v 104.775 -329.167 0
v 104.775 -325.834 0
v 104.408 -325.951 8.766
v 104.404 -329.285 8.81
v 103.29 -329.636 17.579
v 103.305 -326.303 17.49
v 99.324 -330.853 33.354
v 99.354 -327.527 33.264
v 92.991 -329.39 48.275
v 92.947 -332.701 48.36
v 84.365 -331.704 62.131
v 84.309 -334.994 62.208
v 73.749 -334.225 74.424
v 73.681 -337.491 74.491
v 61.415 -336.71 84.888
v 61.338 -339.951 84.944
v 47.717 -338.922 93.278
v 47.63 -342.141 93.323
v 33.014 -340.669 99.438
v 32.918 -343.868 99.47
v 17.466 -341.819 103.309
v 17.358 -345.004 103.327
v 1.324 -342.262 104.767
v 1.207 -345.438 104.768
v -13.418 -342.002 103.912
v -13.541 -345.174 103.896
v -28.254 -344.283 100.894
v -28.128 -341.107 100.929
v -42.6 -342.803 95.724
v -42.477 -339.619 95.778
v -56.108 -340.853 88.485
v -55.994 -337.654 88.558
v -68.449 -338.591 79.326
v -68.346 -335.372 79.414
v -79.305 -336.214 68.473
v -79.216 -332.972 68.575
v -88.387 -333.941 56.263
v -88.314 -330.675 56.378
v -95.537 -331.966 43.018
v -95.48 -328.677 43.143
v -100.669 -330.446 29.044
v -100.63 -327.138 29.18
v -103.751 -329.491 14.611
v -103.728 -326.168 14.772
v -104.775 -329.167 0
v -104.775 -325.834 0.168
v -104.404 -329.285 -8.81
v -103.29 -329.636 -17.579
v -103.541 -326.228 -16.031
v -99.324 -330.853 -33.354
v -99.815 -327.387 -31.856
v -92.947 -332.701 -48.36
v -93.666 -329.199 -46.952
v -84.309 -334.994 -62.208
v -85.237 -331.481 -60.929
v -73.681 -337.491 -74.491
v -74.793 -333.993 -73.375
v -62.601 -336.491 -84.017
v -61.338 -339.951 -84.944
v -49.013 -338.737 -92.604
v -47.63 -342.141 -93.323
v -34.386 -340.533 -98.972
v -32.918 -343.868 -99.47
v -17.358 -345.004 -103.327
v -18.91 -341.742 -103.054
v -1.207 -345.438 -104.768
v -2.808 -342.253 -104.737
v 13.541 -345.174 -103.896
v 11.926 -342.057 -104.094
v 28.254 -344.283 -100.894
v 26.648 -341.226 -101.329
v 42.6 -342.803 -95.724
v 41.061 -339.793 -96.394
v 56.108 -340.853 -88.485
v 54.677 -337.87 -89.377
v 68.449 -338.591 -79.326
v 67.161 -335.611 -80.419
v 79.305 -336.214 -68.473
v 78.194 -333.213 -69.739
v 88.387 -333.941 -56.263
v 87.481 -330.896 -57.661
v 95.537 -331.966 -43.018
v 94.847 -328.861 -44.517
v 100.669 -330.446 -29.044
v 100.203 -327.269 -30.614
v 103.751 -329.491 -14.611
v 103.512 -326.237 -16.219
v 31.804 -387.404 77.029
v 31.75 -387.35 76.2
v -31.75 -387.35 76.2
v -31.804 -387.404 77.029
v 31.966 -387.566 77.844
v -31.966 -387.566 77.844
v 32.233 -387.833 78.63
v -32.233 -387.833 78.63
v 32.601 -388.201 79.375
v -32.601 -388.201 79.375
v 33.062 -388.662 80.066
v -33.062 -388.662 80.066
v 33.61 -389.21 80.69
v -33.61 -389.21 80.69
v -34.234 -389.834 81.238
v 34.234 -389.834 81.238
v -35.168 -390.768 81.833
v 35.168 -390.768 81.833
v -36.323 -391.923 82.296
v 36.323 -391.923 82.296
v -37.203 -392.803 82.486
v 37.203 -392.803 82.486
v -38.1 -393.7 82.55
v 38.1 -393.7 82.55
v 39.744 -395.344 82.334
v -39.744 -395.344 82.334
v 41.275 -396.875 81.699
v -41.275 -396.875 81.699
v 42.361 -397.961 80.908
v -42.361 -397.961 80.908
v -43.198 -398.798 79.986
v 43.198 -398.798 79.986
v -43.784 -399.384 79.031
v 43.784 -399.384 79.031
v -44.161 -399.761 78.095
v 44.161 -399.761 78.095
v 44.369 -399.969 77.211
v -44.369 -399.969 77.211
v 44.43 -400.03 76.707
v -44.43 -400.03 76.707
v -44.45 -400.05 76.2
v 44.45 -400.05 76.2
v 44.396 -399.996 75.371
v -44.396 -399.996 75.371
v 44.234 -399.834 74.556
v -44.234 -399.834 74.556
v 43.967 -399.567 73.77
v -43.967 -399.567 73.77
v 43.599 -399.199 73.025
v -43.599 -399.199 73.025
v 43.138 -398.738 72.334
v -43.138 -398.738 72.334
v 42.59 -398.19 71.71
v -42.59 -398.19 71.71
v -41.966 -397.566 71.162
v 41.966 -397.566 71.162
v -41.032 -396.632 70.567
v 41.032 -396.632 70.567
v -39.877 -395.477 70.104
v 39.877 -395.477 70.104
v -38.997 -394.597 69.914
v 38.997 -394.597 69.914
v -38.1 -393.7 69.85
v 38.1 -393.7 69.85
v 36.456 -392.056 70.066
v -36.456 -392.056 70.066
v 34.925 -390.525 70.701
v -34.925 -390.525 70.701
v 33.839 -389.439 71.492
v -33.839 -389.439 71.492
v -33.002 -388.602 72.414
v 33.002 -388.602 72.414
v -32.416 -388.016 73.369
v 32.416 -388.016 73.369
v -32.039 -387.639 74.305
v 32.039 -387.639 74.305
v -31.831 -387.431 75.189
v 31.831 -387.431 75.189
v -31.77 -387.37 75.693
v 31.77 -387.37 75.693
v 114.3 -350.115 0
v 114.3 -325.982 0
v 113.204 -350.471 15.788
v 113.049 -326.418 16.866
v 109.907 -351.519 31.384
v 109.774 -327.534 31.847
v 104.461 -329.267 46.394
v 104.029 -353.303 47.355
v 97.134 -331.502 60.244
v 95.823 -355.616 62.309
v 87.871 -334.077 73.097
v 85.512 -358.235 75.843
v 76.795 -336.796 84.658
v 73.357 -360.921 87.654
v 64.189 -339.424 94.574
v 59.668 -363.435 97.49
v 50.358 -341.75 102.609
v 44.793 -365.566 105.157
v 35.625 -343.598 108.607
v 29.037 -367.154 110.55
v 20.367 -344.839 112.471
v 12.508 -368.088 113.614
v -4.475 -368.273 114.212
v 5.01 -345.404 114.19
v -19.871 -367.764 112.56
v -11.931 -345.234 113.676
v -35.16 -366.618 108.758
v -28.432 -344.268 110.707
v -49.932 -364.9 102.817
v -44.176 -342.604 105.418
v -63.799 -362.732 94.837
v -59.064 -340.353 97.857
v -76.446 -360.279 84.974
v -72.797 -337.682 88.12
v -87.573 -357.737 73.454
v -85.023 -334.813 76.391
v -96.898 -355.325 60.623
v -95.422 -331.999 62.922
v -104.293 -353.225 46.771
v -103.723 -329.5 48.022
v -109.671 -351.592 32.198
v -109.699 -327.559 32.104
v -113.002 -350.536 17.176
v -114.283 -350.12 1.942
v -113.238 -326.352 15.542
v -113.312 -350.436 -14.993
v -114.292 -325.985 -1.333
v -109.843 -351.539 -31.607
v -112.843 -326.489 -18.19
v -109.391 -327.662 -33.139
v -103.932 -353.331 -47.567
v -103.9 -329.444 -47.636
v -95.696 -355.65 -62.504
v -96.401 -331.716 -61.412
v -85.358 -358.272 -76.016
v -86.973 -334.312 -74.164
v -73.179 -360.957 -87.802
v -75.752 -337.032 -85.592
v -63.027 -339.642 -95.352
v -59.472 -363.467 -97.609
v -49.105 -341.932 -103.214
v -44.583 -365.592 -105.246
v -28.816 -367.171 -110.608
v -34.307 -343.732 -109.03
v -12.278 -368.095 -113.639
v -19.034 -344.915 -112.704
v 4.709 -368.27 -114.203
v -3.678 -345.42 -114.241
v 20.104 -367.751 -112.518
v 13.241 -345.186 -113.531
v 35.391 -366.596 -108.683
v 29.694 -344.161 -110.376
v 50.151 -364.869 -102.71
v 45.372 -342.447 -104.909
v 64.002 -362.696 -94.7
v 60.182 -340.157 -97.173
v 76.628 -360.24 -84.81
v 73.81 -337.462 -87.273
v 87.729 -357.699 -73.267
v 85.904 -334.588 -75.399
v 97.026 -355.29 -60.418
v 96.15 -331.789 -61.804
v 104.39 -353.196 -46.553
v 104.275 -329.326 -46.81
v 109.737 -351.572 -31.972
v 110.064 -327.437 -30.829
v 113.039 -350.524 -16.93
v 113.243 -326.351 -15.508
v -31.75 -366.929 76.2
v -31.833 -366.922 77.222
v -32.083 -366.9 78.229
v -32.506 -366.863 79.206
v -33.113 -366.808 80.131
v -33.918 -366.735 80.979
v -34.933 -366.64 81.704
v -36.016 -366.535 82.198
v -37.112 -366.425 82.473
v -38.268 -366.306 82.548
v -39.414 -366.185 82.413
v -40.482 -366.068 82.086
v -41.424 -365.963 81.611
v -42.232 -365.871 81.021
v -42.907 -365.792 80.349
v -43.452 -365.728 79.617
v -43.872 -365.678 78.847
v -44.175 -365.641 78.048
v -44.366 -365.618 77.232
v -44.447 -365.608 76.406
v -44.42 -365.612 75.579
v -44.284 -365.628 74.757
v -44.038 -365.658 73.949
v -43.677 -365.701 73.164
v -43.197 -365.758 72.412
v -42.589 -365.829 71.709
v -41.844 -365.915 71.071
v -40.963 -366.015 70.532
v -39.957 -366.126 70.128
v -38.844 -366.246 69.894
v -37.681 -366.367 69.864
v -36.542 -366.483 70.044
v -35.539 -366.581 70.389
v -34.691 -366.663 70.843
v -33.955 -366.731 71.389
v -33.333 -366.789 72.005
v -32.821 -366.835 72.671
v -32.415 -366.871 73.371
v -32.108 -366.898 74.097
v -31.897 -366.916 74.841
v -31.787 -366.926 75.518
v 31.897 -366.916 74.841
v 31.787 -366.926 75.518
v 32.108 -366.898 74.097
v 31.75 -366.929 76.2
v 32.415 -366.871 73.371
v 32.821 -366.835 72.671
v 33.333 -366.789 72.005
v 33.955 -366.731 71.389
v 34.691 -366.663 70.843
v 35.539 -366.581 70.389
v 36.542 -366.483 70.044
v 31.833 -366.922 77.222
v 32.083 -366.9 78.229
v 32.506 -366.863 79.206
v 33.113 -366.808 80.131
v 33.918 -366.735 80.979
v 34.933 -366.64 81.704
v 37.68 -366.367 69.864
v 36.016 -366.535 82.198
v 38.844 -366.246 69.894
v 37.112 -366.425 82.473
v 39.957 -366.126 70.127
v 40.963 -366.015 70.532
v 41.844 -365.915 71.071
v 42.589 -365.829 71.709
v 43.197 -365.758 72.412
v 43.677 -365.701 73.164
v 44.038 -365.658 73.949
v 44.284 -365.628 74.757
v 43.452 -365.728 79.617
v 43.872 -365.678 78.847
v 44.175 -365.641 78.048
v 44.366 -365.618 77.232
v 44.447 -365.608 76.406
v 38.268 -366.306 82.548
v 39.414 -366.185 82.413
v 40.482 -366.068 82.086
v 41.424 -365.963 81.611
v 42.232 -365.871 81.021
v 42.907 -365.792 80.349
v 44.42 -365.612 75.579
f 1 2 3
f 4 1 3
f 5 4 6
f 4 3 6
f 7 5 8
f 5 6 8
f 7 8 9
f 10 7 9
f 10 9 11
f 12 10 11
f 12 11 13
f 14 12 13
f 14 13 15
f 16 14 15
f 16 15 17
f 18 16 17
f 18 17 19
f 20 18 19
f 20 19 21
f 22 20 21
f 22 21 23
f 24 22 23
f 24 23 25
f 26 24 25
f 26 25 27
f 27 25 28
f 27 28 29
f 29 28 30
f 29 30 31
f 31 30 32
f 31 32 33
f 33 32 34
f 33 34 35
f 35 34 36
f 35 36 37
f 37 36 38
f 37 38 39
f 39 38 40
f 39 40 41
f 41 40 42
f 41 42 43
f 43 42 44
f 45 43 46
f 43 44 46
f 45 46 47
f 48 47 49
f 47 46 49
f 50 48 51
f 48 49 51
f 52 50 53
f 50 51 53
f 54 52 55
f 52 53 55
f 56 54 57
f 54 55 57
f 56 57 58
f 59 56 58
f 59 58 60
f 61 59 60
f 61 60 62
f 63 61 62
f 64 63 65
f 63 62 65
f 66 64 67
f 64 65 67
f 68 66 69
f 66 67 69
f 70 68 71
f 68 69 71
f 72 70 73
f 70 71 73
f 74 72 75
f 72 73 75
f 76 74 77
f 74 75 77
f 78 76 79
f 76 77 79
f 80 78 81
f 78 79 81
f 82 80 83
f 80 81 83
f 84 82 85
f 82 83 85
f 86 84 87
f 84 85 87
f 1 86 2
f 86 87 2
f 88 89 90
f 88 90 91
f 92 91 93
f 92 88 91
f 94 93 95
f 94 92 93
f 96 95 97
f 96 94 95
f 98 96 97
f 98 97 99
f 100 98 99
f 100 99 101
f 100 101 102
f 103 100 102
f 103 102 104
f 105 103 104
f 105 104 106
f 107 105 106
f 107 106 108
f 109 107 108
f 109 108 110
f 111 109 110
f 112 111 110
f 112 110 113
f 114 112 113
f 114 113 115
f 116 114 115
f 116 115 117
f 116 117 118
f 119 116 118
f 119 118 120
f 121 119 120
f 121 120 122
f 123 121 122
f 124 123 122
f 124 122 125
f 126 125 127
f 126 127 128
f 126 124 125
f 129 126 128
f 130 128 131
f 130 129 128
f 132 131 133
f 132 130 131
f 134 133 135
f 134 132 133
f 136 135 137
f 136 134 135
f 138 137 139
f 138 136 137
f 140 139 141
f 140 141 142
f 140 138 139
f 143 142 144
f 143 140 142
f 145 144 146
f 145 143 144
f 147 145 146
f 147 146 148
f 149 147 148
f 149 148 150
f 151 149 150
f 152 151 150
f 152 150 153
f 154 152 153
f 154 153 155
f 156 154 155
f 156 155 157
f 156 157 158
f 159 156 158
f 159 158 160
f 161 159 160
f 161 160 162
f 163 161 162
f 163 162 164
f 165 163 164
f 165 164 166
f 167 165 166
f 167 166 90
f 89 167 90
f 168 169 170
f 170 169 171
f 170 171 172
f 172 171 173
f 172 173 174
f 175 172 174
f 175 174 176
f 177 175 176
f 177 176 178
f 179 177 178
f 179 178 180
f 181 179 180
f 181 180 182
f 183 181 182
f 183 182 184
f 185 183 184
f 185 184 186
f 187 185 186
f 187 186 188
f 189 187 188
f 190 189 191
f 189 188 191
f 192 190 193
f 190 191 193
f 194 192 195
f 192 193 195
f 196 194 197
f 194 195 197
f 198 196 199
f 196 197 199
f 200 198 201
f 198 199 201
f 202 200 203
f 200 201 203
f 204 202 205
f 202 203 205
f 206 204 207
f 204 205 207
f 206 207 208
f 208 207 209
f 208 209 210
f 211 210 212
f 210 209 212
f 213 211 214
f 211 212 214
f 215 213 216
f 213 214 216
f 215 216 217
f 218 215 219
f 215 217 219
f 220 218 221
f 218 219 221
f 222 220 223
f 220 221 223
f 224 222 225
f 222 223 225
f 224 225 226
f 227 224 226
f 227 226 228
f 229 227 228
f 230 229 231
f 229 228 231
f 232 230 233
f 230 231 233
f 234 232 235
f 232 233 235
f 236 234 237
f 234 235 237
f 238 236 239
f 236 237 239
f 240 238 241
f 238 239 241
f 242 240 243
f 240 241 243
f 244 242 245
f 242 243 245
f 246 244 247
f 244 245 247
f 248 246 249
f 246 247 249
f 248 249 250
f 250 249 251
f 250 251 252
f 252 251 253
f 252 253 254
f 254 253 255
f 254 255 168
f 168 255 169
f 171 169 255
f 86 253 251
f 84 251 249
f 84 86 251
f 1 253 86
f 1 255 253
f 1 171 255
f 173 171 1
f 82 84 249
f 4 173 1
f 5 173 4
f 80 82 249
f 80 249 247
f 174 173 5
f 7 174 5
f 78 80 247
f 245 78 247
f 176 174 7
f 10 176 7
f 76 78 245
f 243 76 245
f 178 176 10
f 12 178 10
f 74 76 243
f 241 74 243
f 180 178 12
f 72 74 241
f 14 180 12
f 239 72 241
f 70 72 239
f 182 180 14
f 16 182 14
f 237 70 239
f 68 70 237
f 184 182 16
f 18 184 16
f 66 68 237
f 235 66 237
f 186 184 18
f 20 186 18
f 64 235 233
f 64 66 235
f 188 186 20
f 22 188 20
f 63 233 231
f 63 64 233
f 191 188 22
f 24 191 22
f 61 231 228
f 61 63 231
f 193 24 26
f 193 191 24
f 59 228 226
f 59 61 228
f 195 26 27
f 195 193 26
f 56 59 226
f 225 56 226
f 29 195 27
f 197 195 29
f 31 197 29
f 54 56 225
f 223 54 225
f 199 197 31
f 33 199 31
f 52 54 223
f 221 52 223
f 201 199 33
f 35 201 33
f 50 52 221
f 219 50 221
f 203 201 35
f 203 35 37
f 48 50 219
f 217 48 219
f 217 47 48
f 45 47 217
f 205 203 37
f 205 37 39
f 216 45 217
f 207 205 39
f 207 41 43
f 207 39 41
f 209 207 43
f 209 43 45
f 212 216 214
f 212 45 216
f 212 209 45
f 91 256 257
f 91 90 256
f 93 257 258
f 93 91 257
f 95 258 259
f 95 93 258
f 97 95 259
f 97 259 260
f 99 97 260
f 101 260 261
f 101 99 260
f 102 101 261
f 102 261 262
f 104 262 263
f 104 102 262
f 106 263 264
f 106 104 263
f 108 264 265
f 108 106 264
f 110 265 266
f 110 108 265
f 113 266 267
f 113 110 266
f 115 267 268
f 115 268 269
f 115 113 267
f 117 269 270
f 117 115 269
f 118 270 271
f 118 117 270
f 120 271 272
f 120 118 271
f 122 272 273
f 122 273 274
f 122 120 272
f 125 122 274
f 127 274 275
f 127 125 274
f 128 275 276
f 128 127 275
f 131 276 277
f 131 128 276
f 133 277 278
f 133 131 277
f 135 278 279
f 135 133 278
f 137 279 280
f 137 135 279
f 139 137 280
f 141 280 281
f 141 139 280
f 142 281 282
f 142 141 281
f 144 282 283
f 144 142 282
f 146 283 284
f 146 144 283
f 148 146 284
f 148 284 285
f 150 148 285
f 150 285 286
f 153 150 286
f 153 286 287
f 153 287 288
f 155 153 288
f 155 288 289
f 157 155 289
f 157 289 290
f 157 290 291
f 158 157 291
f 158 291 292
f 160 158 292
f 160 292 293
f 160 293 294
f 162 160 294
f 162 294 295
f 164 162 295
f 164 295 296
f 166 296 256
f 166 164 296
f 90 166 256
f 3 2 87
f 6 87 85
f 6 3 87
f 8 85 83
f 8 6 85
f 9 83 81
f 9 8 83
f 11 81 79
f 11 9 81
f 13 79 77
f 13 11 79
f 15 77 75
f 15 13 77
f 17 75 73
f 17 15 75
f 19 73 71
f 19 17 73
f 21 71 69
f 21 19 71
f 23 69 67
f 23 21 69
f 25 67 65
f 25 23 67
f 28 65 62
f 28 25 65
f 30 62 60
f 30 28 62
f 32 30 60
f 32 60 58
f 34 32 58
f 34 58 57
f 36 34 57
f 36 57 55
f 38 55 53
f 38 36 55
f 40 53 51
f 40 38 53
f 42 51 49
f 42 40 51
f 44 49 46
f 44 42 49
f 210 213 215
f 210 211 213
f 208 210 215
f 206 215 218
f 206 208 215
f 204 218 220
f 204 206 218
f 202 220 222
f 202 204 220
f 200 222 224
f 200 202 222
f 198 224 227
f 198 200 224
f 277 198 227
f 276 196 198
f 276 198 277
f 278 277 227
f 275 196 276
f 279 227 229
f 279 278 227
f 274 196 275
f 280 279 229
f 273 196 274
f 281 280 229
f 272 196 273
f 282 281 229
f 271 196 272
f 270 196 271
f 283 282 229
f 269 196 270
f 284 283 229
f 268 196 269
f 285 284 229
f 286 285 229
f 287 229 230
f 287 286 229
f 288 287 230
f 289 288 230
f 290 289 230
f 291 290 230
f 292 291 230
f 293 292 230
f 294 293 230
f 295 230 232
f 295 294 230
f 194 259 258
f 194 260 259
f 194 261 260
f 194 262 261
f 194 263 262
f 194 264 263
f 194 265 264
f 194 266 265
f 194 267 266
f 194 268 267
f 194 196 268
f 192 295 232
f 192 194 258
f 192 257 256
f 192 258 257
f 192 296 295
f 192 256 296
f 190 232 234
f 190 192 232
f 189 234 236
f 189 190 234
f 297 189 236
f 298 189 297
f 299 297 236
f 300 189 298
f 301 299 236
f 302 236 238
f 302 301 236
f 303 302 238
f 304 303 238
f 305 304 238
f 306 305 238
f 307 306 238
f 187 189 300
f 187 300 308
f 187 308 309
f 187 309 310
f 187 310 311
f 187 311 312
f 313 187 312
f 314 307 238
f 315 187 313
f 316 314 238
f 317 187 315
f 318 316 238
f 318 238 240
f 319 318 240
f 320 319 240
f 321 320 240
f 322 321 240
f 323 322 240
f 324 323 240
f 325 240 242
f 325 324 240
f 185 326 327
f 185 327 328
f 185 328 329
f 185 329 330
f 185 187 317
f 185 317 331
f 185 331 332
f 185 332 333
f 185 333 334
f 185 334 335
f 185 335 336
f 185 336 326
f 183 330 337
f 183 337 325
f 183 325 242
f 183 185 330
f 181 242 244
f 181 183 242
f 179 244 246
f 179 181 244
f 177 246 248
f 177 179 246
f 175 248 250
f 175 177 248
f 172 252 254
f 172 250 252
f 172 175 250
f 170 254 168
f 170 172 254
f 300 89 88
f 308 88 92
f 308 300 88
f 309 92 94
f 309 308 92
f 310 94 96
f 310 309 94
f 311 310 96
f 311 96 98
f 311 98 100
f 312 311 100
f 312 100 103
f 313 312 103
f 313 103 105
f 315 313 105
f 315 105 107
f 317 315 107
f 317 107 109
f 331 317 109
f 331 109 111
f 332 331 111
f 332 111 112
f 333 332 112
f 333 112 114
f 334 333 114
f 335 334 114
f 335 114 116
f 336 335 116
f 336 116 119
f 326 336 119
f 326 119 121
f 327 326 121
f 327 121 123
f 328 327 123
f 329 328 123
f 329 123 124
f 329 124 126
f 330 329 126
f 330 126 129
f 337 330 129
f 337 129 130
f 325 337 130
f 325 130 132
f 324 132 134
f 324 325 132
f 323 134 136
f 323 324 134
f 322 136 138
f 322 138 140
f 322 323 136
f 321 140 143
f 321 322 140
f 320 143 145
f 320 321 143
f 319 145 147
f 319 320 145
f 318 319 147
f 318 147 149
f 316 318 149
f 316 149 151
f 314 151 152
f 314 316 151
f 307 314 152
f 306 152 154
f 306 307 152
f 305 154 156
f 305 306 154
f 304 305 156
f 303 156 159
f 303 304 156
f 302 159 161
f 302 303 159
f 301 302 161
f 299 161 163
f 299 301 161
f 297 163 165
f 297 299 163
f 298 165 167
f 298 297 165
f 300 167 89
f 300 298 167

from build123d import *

# Parameters (mm, degrees)
F1_DEPTH = 104.775
F2_R     = 159.2251472174
F2_R_2   = 104.775
F3_DEPTH = 414.02
F5_DEPTH = 114.3
F6_R     = 184.3026005328
F6_R_2   = 114.3
F7_DEPTH = 563.88
F9_R     = 6.35


with BuildPart() as f1:
    # F0 (on Top) → F1 (new body, symmetric)
    with BuildSketch(Plane.XY):
        with BuildLine():
            ThreePointArc((104.775, -325.833591884), (0, -342.265), (-104.775, -325.833591884))
            Line((-104.775, -325.833591884), (-104.775, -329.1671201305))
            ThreePointArc((-104.775, -329.1671201305), (0, -345.44), (104.775, -329.1671201305))
            Line((104.775, -329.1671201305), (104.775, -325.833591884))
        make_face()
    extrude(amount=F1_DEPTH, both=True)

    # F2 (on Front) → F3 (cut)
    with BuildSketch(Plane.XZ):
        Circle(F2_R)
        Circle(F2_R_2, mode=Mode.SUBTRACT)
    extrude(amount=F3_DEPTH, mode=Mode.SUBTRACT)

    # F4 (on Top) → F5 (join, symmetric)
    with BuildSketch(Plane.XY):
        with BuildLine():
            Line((-114.3, -325.9820602426), (-114.3, -350.1148383031))
            ThreePointArc((-114.3, -350.1148383031), (0, -368.3), (114.3, -350.1148383031))
            Line((114.3, -350.1148383031), (114.3, -325.9820602426))
            ThreePointArc((114.3, -325.9820602426), (0, -345.44), (-114.3, -325.9820602426))
        make_face()
    extrude(amount=F5_DEPTH, both=True)

    # F6 (on Front) → F7 (cut)
    with BuildSketch(Plane.XZ):
        Circle(F6_R)
        Circle(F6_R_2, mode=Mode.SUBTRACT)
    extrude(amount=F7_DEPTH, mode=Mode.SUBTRACT)

    # F12: sweep along a path in F11
    with BuildLine(Plane.XY.offset(76.2)) as f12_path:
        Line((-38.1, -353.2310128212), (-38.1, -393.7))
        Line((-38.1, -393.7), (0, -393.7))
        Line((0, -393.7), (38.1, -393.7))
        Line((38.1, -393.7), (38.1, -353.2310128212))
    # F9 (on offset) → F12 (sweep)
    with BuildSketch(Plane.XZ.offset(355.6)):
        with Locations((-38.1, 76.2)):
            Circle(F9_R)
    sweep(path=f12_path.line, transition=Transition.RIGHT)


solid = f1.part
